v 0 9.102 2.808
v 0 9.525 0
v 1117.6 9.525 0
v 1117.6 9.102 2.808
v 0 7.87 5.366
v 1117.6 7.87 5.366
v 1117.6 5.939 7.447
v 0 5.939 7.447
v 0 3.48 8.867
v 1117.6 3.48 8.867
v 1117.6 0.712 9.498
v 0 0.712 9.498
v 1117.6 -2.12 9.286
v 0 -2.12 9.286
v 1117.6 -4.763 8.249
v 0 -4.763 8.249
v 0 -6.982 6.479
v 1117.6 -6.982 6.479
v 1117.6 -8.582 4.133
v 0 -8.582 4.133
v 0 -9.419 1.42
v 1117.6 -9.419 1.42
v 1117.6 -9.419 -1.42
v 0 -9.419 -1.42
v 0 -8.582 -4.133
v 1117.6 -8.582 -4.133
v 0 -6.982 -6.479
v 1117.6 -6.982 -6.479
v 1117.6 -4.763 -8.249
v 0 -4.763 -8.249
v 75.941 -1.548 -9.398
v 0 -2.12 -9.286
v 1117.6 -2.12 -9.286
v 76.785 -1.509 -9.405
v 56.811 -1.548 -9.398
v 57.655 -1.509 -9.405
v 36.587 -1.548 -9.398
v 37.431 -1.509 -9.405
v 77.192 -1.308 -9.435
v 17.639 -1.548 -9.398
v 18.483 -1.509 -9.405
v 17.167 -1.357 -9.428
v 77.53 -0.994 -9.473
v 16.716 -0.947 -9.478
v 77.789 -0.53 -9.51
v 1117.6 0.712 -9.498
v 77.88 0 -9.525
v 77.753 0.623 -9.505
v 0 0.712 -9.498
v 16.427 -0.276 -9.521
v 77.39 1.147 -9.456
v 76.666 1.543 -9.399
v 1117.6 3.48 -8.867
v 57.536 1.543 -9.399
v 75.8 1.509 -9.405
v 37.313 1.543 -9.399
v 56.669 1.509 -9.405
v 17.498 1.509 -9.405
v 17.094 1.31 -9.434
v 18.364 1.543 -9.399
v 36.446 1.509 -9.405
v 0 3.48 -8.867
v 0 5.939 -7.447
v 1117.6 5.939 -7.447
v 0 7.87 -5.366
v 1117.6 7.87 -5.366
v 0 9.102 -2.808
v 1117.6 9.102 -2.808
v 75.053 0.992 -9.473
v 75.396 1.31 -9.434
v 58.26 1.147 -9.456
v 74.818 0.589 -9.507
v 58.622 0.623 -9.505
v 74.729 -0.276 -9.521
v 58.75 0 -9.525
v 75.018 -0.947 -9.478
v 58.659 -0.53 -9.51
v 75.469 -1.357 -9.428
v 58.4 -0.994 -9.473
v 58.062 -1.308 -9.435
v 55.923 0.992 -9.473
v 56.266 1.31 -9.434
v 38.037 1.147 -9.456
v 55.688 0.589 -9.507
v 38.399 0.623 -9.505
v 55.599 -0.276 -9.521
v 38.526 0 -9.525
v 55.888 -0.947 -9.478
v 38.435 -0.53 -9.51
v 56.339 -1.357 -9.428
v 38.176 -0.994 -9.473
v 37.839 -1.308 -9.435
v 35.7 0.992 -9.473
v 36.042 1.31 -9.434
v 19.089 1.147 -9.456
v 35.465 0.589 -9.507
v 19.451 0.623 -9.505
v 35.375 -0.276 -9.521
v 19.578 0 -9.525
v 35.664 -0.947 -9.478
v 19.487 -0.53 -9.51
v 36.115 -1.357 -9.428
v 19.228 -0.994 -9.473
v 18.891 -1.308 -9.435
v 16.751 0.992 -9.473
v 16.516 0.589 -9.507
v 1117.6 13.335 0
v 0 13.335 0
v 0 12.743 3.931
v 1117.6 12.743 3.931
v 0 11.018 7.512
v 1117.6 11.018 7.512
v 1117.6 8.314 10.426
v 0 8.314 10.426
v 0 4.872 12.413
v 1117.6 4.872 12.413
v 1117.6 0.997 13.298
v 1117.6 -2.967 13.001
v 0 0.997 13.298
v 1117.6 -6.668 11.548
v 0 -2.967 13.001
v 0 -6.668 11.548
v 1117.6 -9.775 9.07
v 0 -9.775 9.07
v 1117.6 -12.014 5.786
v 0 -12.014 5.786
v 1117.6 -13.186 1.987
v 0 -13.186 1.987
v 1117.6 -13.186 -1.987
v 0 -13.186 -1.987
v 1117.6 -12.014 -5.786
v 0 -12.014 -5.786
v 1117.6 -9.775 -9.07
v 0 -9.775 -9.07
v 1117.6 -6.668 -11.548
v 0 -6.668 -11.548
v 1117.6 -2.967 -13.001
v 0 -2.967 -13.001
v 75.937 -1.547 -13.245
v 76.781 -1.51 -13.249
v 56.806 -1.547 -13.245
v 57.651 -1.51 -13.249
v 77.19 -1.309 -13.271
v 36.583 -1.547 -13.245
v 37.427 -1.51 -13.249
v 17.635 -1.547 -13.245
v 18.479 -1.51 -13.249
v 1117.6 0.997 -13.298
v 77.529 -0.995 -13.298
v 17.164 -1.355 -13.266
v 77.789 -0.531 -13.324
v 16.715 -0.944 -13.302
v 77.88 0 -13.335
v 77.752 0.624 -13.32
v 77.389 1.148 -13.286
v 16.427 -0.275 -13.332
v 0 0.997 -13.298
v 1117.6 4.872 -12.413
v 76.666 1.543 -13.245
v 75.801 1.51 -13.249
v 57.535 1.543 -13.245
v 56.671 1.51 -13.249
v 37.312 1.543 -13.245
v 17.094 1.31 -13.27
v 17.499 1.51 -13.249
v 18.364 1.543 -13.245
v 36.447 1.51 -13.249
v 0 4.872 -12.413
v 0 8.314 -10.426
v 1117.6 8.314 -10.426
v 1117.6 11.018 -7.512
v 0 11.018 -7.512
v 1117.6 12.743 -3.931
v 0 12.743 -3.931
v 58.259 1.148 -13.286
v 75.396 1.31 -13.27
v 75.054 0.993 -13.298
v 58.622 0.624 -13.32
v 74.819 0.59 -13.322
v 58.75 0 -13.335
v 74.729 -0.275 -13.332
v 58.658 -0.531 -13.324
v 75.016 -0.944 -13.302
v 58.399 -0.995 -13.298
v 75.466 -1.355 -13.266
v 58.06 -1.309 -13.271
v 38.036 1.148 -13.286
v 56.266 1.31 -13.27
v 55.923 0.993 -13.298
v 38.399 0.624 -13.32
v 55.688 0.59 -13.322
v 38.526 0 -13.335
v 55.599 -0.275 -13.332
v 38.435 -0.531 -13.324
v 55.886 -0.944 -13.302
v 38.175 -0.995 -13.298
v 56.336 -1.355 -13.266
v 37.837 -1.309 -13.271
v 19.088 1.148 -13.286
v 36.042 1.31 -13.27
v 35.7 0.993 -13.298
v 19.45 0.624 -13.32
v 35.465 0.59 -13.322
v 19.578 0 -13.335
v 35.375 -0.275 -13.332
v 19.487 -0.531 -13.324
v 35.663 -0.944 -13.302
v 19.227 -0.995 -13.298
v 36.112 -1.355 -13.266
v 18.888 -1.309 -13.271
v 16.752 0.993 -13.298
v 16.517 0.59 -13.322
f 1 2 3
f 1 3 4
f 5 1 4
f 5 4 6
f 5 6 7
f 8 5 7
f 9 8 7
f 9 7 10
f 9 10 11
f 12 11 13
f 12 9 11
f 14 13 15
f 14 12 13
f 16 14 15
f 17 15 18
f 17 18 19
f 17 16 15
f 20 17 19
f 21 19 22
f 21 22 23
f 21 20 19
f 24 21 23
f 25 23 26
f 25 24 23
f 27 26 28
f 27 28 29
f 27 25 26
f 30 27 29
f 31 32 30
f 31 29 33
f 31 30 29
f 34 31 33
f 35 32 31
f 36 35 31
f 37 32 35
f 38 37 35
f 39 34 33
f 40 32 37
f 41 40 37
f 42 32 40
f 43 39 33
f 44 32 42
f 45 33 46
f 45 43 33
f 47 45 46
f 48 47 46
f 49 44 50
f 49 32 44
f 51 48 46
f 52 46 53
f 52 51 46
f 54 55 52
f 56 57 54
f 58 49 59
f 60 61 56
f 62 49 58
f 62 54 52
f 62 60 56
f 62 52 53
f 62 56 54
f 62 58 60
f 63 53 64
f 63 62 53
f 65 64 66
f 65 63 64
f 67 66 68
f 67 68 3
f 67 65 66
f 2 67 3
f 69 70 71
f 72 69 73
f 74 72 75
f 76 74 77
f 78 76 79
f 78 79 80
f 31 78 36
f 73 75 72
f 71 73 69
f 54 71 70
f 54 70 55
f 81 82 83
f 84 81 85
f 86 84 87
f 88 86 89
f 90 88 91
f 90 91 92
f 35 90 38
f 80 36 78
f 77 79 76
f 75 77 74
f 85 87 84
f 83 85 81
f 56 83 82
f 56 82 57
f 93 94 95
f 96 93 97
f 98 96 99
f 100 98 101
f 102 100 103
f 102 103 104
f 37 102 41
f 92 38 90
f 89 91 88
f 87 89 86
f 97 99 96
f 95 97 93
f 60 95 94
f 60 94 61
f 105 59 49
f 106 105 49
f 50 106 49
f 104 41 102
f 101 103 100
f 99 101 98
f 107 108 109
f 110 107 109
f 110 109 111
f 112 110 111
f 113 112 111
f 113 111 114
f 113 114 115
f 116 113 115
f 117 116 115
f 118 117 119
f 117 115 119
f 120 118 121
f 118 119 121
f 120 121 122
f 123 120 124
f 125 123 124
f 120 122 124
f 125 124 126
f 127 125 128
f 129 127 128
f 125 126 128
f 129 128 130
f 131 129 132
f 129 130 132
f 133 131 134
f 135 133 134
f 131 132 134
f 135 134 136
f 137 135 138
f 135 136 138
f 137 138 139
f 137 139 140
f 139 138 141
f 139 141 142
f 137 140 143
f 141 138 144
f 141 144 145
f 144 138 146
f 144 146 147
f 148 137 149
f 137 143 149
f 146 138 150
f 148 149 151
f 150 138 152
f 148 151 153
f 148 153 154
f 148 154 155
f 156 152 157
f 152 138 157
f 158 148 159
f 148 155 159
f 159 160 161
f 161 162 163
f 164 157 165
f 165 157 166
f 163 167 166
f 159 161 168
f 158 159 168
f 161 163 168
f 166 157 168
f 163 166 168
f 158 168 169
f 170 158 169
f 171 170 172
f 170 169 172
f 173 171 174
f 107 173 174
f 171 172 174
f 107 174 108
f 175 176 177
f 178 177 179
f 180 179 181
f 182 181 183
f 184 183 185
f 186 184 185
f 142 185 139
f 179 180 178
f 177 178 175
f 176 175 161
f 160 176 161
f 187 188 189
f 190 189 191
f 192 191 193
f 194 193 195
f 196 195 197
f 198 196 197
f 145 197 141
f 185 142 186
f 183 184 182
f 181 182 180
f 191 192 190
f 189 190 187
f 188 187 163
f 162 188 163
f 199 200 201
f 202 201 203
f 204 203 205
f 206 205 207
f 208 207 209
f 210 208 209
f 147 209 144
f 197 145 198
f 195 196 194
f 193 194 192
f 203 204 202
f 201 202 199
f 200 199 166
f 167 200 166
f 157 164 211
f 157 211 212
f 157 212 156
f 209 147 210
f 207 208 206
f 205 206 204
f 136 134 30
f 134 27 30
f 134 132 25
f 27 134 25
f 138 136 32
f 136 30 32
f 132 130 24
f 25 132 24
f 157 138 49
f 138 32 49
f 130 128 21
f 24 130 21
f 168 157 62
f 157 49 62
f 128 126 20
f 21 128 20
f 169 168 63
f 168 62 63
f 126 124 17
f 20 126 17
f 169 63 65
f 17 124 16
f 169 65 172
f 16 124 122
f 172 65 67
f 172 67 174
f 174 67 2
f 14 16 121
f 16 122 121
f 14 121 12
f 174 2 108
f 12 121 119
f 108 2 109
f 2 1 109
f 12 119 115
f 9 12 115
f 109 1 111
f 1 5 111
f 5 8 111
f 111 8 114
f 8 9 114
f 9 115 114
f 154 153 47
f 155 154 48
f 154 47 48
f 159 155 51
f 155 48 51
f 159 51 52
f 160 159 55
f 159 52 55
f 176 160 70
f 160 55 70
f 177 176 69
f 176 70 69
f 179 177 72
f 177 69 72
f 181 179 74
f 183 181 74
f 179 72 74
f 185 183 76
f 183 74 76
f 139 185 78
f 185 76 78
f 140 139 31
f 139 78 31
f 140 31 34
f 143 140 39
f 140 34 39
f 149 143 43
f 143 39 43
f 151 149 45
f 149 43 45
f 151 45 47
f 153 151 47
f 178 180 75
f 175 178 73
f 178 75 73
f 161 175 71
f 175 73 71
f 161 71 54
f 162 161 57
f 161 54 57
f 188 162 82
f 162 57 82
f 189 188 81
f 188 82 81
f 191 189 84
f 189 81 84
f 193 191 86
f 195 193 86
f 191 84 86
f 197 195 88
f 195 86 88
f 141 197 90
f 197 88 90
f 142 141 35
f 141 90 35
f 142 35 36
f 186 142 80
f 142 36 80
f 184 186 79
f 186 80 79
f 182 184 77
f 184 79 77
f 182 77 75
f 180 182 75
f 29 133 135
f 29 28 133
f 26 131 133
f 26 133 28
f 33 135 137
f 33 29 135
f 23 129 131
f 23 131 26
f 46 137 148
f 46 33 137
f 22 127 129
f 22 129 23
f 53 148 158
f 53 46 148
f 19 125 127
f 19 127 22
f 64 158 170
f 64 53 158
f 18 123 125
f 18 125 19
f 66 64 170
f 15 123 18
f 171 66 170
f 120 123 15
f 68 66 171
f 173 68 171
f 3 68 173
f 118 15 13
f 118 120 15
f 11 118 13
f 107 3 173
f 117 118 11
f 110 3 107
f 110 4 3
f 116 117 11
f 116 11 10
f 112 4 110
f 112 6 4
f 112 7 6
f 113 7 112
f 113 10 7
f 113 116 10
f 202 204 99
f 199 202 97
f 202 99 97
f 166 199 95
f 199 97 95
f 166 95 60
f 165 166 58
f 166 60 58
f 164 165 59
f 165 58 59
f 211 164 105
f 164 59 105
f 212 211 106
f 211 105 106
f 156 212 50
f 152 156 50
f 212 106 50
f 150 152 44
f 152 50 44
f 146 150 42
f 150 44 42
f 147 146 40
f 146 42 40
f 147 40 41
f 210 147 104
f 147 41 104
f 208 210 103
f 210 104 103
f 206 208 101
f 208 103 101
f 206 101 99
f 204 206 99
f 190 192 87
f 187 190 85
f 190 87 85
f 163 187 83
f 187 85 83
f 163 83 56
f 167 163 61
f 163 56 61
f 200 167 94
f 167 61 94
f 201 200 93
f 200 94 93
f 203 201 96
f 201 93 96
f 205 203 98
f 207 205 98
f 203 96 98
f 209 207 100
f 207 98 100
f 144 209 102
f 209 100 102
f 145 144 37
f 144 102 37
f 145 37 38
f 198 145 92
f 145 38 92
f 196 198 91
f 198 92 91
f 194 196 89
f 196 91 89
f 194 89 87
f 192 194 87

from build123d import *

# Parameters (mm, degrees)
F0_R     = 13.335
F0_R_2   = 9.525
F1_DEPTH = 1117.6
F3_D     = 3.175
F3_DEPTH = 25.4
F3_TIP   = 0.9538662327
F4_D     = 3.175
F4_DEPTH = 25.4
F4_TIP   = 0.9538662327
F5_D     = 3.175
F5_DEPTH = 25.4
F5_TIP   = 0.9538662327
F6_D     = 3.175
F6_DEPTH = 25.4
F6_TIP   = 0.9538662327


with BuildPart() as f1:
    # F0 (on Right) → F1 (new body)
    with BuildSketch(Plane.YZ):
        Circle(F0_R)
        Circle(F0_R_2, mode=Mode.SUBTRACT)
    extrude(amount=F1_DEPTH)

    # F3 (one way)
    with BuildSketch(Plane.XY):
        with Locations((17.9905965924, 0)):
            Circle(F3_D / 2)
    extrude(amount=-F3_DEPTH, mode=Mode.SUBTRACT)
    with Locations(Plane.XY):
        with Locations((17.9905965924, 0)):
            with Locations((0, 0, -(F3_DEPTH + F3_TIP / 2))):  # 118° drill point
                Cone(0, F3_D / 2, F3_TIP, mode=Mode.SUBTRACT)

    # F4 (one way)
    with BuildSketch(Plane.XY):
        with Locations((36.9387045503, 0)):
            Circle(F4_D / 2)
    extrude(amount=-F4_DEPTH, mode=Mode.SUBTRACT)
    with Locations(Plane.XY):
        with Locations((36.9387045503, 0)):
            with Locations((0, 0, -(F4_DEPTH + F4_TIP / 2))):  # 118° drill point
                Cone(0, F4_D / 2, F4_TIP, mode=Mode.SUBTRACT)

    # F5 (one way)
    with BuildSketch(Plane.XY):
        with Locations((76.2924551964, 0)):
            Circle(F5_D / 2)
    extrude(amount=-F5_DEPTH, mode=Mode.SUBTRACT)
    with Locations(Plane.XY):
        with Locations((76.2924551964, 0)):
            with Locations((0, 0, -(F5_DEPTH + F5_TIP / 2))):  # 118° drill point
                Cone(0, F5_D / 2, F5_TIP, mode=Mode.SUBTRACT)

    # F6 (one way)
    with BuildSketch(Plane.XY):
        with Locations((57.1621619165, 0)):
            Circle(F6_D / 2)
    extrude(amount=-F6_DEPTH, mode=Mode.SUBTRACT)
    with Locations(Plane.XY):
        with Locations((57.1621619165, 0)):
            with Locations((0, 0, -(F6_DEPTH + F6_TIP / 2))):  # 118° drill point
                Cone(0, F6_D / 2, F6_TIP, mode=Mode.SUBTRACT)


solid = f1.part
